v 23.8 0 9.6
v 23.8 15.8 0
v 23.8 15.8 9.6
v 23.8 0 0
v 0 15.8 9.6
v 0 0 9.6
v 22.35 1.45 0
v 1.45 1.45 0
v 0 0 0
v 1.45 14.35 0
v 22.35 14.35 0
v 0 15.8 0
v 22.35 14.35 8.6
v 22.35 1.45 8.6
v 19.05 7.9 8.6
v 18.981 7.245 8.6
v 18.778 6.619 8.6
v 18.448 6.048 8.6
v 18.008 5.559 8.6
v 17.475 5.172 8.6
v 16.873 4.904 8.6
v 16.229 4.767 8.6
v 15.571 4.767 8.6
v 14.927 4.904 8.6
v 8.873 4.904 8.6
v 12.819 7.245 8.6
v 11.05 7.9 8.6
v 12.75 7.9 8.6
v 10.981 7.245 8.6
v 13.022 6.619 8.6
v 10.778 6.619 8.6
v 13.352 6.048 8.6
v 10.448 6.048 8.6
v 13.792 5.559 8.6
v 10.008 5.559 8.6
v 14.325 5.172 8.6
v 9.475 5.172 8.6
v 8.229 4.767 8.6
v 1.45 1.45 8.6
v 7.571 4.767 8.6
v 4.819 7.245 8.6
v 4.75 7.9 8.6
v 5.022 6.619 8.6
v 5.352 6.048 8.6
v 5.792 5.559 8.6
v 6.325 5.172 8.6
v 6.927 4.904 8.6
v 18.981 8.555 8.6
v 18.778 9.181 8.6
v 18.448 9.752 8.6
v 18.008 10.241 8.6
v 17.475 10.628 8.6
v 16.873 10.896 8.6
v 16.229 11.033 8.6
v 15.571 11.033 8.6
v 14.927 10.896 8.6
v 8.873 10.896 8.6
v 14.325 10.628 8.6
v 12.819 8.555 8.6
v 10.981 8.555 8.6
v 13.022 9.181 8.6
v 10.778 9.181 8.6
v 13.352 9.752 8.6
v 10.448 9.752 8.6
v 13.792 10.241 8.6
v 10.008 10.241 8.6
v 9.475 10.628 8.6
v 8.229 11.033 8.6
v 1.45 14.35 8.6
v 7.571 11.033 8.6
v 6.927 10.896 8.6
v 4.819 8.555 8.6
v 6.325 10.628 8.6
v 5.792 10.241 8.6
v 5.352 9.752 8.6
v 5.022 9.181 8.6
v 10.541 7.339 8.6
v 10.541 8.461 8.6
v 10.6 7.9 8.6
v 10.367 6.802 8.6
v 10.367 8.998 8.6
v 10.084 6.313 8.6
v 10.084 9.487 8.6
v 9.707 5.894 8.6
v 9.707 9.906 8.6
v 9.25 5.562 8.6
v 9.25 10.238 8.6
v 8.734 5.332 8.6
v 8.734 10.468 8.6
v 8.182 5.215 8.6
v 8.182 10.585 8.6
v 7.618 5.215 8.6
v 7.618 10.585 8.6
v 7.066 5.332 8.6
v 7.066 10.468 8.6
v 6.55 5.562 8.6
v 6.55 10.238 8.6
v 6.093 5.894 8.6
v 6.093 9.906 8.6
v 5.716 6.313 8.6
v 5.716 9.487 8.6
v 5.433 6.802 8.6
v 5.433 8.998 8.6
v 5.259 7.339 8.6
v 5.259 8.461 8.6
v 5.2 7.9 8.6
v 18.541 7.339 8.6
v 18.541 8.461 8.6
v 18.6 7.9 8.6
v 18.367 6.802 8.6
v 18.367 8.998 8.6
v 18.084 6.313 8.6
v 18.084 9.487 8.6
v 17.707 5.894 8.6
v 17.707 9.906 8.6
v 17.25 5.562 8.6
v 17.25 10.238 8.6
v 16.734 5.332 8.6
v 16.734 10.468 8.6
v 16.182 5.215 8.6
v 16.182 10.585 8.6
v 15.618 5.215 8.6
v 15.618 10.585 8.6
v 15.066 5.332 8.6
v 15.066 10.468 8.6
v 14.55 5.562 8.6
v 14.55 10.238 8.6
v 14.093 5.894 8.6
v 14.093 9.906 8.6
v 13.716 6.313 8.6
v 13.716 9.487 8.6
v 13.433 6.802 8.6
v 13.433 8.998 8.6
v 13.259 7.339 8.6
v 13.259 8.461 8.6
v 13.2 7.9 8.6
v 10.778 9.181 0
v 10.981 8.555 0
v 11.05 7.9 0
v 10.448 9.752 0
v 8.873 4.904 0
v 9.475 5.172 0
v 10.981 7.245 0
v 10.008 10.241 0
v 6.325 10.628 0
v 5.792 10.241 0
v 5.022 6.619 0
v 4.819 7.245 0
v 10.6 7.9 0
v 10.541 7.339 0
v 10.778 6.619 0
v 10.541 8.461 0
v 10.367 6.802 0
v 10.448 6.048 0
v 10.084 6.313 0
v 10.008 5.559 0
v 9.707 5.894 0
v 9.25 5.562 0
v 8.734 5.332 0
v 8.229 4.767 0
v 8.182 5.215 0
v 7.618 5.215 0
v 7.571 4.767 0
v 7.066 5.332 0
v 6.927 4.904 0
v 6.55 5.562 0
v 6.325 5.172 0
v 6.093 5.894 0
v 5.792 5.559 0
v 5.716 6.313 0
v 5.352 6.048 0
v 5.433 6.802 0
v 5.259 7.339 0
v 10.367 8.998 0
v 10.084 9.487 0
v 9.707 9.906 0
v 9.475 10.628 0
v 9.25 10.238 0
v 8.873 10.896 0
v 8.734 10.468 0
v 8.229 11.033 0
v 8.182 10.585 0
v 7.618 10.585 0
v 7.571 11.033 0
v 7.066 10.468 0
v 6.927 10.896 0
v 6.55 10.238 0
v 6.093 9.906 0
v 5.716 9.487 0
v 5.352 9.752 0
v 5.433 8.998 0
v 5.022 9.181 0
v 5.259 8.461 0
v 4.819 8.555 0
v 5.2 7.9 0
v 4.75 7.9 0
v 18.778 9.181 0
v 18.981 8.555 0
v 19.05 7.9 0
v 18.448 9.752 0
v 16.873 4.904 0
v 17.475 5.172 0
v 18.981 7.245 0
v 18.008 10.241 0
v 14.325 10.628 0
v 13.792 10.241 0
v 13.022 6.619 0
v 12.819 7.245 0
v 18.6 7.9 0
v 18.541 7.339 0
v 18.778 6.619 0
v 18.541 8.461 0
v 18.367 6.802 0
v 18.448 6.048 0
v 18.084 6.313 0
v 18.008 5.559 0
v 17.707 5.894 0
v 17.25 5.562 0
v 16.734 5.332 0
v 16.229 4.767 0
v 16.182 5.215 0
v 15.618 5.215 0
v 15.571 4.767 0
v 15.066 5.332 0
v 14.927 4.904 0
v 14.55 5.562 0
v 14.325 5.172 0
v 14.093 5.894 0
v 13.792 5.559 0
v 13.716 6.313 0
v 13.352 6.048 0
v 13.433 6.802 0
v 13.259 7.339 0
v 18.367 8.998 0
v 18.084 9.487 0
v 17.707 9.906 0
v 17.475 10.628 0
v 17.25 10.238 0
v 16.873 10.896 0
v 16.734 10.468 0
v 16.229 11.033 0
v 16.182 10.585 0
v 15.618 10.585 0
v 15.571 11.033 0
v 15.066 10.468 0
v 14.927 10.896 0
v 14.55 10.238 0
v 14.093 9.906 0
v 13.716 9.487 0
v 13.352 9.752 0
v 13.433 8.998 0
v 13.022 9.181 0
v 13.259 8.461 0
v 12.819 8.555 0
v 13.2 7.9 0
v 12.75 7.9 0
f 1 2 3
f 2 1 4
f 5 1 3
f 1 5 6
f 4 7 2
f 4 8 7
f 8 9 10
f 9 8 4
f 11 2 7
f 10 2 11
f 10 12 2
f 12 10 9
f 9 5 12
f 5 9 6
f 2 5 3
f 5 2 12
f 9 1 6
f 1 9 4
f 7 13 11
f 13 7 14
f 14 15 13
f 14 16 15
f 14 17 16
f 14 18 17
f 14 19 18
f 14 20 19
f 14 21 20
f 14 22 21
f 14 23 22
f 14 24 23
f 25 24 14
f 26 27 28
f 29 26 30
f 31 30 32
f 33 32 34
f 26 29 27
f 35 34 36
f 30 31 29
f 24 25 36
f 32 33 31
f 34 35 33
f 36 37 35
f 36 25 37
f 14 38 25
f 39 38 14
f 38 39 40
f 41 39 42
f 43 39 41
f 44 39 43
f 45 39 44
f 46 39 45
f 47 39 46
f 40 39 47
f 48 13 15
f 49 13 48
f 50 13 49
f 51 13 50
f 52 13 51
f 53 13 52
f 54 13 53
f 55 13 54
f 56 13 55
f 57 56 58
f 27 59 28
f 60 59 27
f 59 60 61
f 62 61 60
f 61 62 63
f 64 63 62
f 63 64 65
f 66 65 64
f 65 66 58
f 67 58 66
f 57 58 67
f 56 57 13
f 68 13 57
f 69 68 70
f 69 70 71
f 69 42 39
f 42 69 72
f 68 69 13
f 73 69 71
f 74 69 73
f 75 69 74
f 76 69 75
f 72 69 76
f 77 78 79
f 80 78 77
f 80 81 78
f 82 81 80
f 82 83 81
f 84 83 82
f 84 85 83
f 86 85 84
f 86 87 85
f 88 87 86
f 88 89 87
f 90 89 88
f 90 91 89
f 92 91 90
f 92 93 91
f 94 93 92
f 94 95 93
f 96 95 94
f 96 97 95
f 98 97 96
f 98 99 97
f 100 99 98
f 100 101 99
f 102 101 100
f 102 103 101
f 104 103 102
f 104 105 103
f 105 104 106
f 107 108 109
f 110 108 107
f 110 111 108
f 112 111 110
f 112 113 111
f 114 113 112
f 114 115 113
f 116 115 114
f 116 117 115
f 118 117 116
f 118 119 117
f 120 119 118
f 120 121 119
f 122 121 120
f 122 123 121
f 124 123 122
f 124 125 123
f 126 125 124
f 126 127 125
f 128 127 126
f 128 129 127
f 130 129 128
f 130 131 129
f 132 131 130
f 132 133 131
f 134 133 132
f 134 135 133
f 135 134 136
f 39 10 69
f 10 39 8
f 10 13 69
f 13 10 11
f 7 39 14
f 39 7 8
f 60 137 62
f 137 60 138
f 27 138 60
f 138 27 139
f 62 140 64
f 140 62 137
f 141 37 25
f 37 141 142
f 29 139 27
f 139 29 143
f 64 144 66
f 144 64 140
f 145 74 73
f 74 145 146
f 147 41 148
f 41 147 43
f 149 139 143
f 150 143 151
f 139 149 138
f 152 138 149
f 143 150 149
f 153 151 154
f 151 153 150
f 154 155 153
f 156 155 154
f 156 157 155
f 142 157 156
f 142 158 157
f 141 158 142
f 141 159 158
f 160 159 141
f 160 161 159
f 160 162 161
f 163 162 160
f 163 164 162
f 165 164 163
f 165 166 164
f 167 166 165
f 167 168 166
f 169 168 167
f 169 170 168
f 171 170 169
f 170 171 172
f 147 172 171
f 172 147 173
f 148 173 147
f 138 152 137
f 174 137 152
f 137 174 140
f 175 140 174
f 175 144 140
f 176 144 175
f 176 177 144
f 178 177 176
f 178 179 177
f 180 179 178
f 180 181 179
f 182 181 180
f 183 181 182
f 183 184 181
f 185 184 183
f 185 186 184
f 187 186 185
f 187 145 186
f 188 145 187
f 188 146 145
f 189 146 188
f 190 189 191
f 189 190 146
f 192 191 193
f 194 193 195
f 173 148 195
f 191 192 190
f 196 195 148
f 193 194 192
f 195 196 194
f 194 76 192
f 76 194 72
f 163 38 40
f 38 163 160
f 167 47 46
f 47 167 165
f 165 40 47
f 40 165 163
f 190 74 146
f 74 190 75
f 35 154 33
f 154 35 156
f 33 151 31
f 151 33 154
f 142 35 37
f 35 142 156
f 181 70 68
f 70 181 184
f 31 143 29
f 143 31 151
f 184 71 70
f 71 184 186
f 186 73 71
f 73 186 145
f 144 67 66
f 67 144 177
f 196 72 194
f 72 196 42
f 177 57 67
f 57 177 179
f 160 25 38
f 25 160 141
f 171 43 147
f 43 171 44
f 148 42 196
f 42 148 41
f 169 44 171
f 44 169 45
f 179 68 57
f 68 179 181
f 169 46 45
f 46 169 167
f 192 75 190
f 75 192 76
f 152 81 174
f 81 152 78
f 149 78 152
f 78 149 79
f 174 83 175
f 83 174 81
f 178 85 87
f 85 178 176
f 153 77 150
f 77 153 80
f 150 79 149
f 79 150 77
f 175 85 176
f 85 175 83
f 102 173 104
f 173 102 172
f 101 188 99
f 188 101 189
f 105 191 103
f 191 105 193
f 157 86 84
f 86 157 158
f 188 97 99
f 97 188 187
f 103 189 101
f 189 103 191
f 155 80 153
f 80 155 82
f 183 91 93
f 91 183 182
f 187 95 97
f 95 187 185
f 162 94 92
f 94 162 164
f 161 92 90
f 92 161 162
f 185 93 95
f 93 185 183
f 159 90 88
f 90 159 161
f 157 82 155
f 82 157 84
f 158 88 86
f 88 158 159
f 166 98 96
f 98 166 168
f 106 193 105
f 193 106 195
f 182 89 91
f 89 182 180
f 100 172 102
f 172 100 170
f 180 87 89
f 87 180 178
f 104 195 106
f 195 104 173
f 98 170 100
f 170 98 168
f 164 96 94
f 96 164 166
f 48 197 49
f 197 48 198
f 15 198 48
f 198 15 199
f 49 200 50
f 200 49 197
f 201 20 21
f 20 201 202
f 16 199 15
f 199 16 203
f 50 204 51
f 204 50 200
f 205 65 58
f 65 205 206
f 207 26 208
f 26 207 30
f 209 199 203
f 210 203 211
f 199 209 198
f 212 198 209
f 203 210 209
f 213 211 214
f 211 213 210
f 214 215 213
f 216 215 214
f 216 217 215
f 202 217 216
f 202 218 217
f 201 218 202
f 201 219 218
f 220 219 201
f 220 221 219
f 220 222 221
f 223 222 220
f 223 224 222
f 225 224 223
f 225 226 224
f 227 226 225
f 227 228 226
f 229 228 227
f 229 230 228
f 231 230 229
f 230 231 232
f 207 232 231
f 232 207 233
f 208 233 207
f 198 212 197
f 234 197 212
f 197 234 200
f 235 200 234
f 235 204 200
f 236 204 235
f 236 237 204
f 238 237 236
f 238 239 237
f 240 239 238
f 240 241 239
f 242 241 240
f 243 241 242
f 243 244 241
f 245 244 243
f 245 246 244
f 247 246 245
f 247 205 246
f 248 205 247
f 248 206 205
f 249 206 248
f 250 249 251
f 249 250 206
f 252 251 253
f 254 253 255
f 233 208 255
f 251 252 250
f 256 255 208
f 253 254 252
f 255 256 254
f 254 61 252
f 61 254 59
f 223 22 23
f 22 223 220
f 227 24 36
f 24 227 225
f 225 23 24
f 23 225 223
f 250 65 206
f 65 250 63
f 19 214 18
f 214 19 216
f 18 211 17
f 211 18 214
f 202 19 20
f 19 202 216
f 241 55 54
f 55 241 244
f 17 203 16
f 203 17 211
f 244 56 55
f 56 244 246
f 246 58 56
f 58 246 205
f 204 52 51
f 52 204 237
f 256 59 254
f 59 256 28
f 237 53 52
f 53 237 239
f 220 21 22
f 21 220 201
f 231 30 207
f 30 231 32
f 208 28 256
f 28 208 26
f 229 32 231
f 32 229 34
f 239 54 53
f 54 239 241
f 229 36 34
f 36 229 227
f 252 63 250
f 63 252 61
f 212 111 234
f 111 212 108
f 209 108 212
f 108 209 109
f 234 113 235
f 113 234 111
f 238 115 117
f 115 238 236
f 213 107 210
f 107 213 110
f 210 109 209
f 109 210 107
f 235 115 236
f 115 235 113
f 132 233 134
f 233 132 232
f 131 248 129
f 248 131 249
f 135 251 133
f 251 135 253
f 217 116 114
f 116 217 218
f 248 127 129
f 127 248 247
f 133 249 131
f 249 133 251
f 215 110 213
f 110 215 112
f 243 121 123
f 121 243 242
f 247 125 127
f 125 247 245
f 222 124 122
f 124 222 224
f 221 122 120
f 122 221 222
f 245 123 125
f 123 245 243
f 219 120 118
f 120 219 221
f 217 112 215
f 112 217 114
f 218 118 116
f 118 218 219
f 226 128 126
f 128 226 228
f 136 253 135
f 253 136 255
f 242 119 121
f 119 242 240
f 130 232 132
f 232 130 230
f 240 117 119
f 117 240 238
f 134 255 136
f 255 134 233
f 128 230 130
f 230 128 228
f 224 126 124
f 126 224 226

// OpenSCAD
// file: posts.scad
/**
 * Derived from http://www.thingiverse.com/thing:5699
 * LEGO, the LEGO logo, the Brick, DUPLO, and MINDSTORMS are trademarks of the LEGO Group. 2012 The LEGO Group.
 */

include <common.scad>

module posts(real_width, real_length, real_height, overall_width, overall_length) {
  if (real_width > 1 && real_length > 1) {
    _posts(real_width, real_length, real_height, overall_width, overall_length);
  } else if (real_width == 1 && real_length > 1) {
    pins(real_width, real_length, real_height, overall_width, overall_length);
  }
}

module _posts(real_width, real_length, real_height, overall_width, overall_length) {
  
  // LEGO standard dimensions, but adjusted for brick params
  total_posts_length = (post_diameter * (real_length - 1)) + ((real_length - 2) * (stud_spacing - post_diameter));
  total_posts_width = (post_diameter * (real_width - 1)) + ((real_width - 2) * (stud_spacing - post_diameter));
  
  translate([post_diameter / 2, post_diameter / 2, 0]) {
    translate([(overall_length - total_posts_length) / 2, (overall_width - total_posts_width) / 2, 0]) {
      union() {
        // Posts
        for (ycount = [1 : real_width - 1]) {
          for (xcount = [1 : real_length - 1]) {
            translate([(xcount - 1) * stud_spacing, (ycount - 1) * stud_spacing, 0]) 
            post(real_height);
          }
        }
      }
    }
  }
}

module post(real_height) {
  difference() {
    cylinder(r = post_diameter / 2, 
             h = real_height * block_height, 
             $fs = cylinder_precision);
    // remove the inside
    translate([0, 0, -(post_wall_thickness + 0.05)]) 
    cylinder(r = (post_diameter / 2) - post_wall_thickness, 
             h = real_height * block_height + 1,
             $fs = cylinder_precision);
  }
}

module pins(real_width, real_length, real_height, overall_width, overall_length) {
  
  // LEGO standard dimensions, but adjusted for brick params
  total_pins_width = (pin_diameter * (real_width - 1)) + max(0, ((real_width - 2) * (stud_spacing - pin_diameter)));
  total_pins_length = (pin_diameter * (real_length - 1)) + max(0, ((real_length - 2) * (stud_spacing - pin_diameter)));

  translate([(pin_diameter / 2) + (overall_length - total_pins_length) / 2, overall_width / 2, 0]) {
    for (xcount = [1 : real_length - 1]) {
      translate([(xcount - 1) * stud_spacing, 0, 0]) 
      cylinder(r = pin_diameter / 2,
               h = block_height * real_height,
               $fs = cylinder_precision);
    }
  }
}
// file: common.scad
/**
 * Derived from http://www.thingiverse.com/thing:5699
 *
 * LEGO, the LEGO logo, the Brick, DUPLO, and MINDSTORMS are trademarks of the LEGO Group. 2012 The LEGO Group.
 */

// LEGO standard dimensions - (no duplos)
// heights
block_height = 9.6;
plate_height = 9.6 / 3;

// pins and posts 
cylinder_precision = 0.1;
pin_diameter = 3.2;
post_diameter = 6.3;
post_wall_thickness = 0.45;

roof_thickness = 1;

stud_spacing = 8;

wall_play = 0.1;
wall_thickness = 1.45;


//
// cool hash function for structs
// dog = [
//  "fur", "black",
//  "legs", 4
// ];
// hash( dog, "legs")
//
function hash(h,k)= ( h[search([k], [for(i=[0:2:len(h)-2])h[i]])[0]*2+1] ); 
// main file
/**
 * Derived from http://www.thingiverse.com/thing:5699
 *
 * LEGO, the LEGO logo, the Brick, DUPLO, and MINDSTORMS are trademarks of the LEGO Group. 2012 The LEGO Group.
 */

include <common.scad>
include <posts.scad>

block(2, 3, 1);

module block(width, length, height) {
  // calculate real dimensions based on stud count
  real_height = max(1/3, height);
  real_length = max(width, length);
  real_width = min(width, length);
  overall_length = (real_length * stud_spacing) - (2 * wall_play);
  overall_width = (real_width * stud_spacing) - (2 * wall_play);
  
  union() {
    difference() {
      // brick mass
      cube([overall_length, overall_width, real_height * block_height]);
      // curve out
      translate([wall_thickness, wall_thickness, -roof_thickness]) 
      cube([overall_length - wall_thickness * 2, overall_width - wall_thickness * 2, block_height * real_height]);
    }
    // underneath posts or pins
    posts(real_width, real_length, real_height, overall_width, overall_length);
  }
}
